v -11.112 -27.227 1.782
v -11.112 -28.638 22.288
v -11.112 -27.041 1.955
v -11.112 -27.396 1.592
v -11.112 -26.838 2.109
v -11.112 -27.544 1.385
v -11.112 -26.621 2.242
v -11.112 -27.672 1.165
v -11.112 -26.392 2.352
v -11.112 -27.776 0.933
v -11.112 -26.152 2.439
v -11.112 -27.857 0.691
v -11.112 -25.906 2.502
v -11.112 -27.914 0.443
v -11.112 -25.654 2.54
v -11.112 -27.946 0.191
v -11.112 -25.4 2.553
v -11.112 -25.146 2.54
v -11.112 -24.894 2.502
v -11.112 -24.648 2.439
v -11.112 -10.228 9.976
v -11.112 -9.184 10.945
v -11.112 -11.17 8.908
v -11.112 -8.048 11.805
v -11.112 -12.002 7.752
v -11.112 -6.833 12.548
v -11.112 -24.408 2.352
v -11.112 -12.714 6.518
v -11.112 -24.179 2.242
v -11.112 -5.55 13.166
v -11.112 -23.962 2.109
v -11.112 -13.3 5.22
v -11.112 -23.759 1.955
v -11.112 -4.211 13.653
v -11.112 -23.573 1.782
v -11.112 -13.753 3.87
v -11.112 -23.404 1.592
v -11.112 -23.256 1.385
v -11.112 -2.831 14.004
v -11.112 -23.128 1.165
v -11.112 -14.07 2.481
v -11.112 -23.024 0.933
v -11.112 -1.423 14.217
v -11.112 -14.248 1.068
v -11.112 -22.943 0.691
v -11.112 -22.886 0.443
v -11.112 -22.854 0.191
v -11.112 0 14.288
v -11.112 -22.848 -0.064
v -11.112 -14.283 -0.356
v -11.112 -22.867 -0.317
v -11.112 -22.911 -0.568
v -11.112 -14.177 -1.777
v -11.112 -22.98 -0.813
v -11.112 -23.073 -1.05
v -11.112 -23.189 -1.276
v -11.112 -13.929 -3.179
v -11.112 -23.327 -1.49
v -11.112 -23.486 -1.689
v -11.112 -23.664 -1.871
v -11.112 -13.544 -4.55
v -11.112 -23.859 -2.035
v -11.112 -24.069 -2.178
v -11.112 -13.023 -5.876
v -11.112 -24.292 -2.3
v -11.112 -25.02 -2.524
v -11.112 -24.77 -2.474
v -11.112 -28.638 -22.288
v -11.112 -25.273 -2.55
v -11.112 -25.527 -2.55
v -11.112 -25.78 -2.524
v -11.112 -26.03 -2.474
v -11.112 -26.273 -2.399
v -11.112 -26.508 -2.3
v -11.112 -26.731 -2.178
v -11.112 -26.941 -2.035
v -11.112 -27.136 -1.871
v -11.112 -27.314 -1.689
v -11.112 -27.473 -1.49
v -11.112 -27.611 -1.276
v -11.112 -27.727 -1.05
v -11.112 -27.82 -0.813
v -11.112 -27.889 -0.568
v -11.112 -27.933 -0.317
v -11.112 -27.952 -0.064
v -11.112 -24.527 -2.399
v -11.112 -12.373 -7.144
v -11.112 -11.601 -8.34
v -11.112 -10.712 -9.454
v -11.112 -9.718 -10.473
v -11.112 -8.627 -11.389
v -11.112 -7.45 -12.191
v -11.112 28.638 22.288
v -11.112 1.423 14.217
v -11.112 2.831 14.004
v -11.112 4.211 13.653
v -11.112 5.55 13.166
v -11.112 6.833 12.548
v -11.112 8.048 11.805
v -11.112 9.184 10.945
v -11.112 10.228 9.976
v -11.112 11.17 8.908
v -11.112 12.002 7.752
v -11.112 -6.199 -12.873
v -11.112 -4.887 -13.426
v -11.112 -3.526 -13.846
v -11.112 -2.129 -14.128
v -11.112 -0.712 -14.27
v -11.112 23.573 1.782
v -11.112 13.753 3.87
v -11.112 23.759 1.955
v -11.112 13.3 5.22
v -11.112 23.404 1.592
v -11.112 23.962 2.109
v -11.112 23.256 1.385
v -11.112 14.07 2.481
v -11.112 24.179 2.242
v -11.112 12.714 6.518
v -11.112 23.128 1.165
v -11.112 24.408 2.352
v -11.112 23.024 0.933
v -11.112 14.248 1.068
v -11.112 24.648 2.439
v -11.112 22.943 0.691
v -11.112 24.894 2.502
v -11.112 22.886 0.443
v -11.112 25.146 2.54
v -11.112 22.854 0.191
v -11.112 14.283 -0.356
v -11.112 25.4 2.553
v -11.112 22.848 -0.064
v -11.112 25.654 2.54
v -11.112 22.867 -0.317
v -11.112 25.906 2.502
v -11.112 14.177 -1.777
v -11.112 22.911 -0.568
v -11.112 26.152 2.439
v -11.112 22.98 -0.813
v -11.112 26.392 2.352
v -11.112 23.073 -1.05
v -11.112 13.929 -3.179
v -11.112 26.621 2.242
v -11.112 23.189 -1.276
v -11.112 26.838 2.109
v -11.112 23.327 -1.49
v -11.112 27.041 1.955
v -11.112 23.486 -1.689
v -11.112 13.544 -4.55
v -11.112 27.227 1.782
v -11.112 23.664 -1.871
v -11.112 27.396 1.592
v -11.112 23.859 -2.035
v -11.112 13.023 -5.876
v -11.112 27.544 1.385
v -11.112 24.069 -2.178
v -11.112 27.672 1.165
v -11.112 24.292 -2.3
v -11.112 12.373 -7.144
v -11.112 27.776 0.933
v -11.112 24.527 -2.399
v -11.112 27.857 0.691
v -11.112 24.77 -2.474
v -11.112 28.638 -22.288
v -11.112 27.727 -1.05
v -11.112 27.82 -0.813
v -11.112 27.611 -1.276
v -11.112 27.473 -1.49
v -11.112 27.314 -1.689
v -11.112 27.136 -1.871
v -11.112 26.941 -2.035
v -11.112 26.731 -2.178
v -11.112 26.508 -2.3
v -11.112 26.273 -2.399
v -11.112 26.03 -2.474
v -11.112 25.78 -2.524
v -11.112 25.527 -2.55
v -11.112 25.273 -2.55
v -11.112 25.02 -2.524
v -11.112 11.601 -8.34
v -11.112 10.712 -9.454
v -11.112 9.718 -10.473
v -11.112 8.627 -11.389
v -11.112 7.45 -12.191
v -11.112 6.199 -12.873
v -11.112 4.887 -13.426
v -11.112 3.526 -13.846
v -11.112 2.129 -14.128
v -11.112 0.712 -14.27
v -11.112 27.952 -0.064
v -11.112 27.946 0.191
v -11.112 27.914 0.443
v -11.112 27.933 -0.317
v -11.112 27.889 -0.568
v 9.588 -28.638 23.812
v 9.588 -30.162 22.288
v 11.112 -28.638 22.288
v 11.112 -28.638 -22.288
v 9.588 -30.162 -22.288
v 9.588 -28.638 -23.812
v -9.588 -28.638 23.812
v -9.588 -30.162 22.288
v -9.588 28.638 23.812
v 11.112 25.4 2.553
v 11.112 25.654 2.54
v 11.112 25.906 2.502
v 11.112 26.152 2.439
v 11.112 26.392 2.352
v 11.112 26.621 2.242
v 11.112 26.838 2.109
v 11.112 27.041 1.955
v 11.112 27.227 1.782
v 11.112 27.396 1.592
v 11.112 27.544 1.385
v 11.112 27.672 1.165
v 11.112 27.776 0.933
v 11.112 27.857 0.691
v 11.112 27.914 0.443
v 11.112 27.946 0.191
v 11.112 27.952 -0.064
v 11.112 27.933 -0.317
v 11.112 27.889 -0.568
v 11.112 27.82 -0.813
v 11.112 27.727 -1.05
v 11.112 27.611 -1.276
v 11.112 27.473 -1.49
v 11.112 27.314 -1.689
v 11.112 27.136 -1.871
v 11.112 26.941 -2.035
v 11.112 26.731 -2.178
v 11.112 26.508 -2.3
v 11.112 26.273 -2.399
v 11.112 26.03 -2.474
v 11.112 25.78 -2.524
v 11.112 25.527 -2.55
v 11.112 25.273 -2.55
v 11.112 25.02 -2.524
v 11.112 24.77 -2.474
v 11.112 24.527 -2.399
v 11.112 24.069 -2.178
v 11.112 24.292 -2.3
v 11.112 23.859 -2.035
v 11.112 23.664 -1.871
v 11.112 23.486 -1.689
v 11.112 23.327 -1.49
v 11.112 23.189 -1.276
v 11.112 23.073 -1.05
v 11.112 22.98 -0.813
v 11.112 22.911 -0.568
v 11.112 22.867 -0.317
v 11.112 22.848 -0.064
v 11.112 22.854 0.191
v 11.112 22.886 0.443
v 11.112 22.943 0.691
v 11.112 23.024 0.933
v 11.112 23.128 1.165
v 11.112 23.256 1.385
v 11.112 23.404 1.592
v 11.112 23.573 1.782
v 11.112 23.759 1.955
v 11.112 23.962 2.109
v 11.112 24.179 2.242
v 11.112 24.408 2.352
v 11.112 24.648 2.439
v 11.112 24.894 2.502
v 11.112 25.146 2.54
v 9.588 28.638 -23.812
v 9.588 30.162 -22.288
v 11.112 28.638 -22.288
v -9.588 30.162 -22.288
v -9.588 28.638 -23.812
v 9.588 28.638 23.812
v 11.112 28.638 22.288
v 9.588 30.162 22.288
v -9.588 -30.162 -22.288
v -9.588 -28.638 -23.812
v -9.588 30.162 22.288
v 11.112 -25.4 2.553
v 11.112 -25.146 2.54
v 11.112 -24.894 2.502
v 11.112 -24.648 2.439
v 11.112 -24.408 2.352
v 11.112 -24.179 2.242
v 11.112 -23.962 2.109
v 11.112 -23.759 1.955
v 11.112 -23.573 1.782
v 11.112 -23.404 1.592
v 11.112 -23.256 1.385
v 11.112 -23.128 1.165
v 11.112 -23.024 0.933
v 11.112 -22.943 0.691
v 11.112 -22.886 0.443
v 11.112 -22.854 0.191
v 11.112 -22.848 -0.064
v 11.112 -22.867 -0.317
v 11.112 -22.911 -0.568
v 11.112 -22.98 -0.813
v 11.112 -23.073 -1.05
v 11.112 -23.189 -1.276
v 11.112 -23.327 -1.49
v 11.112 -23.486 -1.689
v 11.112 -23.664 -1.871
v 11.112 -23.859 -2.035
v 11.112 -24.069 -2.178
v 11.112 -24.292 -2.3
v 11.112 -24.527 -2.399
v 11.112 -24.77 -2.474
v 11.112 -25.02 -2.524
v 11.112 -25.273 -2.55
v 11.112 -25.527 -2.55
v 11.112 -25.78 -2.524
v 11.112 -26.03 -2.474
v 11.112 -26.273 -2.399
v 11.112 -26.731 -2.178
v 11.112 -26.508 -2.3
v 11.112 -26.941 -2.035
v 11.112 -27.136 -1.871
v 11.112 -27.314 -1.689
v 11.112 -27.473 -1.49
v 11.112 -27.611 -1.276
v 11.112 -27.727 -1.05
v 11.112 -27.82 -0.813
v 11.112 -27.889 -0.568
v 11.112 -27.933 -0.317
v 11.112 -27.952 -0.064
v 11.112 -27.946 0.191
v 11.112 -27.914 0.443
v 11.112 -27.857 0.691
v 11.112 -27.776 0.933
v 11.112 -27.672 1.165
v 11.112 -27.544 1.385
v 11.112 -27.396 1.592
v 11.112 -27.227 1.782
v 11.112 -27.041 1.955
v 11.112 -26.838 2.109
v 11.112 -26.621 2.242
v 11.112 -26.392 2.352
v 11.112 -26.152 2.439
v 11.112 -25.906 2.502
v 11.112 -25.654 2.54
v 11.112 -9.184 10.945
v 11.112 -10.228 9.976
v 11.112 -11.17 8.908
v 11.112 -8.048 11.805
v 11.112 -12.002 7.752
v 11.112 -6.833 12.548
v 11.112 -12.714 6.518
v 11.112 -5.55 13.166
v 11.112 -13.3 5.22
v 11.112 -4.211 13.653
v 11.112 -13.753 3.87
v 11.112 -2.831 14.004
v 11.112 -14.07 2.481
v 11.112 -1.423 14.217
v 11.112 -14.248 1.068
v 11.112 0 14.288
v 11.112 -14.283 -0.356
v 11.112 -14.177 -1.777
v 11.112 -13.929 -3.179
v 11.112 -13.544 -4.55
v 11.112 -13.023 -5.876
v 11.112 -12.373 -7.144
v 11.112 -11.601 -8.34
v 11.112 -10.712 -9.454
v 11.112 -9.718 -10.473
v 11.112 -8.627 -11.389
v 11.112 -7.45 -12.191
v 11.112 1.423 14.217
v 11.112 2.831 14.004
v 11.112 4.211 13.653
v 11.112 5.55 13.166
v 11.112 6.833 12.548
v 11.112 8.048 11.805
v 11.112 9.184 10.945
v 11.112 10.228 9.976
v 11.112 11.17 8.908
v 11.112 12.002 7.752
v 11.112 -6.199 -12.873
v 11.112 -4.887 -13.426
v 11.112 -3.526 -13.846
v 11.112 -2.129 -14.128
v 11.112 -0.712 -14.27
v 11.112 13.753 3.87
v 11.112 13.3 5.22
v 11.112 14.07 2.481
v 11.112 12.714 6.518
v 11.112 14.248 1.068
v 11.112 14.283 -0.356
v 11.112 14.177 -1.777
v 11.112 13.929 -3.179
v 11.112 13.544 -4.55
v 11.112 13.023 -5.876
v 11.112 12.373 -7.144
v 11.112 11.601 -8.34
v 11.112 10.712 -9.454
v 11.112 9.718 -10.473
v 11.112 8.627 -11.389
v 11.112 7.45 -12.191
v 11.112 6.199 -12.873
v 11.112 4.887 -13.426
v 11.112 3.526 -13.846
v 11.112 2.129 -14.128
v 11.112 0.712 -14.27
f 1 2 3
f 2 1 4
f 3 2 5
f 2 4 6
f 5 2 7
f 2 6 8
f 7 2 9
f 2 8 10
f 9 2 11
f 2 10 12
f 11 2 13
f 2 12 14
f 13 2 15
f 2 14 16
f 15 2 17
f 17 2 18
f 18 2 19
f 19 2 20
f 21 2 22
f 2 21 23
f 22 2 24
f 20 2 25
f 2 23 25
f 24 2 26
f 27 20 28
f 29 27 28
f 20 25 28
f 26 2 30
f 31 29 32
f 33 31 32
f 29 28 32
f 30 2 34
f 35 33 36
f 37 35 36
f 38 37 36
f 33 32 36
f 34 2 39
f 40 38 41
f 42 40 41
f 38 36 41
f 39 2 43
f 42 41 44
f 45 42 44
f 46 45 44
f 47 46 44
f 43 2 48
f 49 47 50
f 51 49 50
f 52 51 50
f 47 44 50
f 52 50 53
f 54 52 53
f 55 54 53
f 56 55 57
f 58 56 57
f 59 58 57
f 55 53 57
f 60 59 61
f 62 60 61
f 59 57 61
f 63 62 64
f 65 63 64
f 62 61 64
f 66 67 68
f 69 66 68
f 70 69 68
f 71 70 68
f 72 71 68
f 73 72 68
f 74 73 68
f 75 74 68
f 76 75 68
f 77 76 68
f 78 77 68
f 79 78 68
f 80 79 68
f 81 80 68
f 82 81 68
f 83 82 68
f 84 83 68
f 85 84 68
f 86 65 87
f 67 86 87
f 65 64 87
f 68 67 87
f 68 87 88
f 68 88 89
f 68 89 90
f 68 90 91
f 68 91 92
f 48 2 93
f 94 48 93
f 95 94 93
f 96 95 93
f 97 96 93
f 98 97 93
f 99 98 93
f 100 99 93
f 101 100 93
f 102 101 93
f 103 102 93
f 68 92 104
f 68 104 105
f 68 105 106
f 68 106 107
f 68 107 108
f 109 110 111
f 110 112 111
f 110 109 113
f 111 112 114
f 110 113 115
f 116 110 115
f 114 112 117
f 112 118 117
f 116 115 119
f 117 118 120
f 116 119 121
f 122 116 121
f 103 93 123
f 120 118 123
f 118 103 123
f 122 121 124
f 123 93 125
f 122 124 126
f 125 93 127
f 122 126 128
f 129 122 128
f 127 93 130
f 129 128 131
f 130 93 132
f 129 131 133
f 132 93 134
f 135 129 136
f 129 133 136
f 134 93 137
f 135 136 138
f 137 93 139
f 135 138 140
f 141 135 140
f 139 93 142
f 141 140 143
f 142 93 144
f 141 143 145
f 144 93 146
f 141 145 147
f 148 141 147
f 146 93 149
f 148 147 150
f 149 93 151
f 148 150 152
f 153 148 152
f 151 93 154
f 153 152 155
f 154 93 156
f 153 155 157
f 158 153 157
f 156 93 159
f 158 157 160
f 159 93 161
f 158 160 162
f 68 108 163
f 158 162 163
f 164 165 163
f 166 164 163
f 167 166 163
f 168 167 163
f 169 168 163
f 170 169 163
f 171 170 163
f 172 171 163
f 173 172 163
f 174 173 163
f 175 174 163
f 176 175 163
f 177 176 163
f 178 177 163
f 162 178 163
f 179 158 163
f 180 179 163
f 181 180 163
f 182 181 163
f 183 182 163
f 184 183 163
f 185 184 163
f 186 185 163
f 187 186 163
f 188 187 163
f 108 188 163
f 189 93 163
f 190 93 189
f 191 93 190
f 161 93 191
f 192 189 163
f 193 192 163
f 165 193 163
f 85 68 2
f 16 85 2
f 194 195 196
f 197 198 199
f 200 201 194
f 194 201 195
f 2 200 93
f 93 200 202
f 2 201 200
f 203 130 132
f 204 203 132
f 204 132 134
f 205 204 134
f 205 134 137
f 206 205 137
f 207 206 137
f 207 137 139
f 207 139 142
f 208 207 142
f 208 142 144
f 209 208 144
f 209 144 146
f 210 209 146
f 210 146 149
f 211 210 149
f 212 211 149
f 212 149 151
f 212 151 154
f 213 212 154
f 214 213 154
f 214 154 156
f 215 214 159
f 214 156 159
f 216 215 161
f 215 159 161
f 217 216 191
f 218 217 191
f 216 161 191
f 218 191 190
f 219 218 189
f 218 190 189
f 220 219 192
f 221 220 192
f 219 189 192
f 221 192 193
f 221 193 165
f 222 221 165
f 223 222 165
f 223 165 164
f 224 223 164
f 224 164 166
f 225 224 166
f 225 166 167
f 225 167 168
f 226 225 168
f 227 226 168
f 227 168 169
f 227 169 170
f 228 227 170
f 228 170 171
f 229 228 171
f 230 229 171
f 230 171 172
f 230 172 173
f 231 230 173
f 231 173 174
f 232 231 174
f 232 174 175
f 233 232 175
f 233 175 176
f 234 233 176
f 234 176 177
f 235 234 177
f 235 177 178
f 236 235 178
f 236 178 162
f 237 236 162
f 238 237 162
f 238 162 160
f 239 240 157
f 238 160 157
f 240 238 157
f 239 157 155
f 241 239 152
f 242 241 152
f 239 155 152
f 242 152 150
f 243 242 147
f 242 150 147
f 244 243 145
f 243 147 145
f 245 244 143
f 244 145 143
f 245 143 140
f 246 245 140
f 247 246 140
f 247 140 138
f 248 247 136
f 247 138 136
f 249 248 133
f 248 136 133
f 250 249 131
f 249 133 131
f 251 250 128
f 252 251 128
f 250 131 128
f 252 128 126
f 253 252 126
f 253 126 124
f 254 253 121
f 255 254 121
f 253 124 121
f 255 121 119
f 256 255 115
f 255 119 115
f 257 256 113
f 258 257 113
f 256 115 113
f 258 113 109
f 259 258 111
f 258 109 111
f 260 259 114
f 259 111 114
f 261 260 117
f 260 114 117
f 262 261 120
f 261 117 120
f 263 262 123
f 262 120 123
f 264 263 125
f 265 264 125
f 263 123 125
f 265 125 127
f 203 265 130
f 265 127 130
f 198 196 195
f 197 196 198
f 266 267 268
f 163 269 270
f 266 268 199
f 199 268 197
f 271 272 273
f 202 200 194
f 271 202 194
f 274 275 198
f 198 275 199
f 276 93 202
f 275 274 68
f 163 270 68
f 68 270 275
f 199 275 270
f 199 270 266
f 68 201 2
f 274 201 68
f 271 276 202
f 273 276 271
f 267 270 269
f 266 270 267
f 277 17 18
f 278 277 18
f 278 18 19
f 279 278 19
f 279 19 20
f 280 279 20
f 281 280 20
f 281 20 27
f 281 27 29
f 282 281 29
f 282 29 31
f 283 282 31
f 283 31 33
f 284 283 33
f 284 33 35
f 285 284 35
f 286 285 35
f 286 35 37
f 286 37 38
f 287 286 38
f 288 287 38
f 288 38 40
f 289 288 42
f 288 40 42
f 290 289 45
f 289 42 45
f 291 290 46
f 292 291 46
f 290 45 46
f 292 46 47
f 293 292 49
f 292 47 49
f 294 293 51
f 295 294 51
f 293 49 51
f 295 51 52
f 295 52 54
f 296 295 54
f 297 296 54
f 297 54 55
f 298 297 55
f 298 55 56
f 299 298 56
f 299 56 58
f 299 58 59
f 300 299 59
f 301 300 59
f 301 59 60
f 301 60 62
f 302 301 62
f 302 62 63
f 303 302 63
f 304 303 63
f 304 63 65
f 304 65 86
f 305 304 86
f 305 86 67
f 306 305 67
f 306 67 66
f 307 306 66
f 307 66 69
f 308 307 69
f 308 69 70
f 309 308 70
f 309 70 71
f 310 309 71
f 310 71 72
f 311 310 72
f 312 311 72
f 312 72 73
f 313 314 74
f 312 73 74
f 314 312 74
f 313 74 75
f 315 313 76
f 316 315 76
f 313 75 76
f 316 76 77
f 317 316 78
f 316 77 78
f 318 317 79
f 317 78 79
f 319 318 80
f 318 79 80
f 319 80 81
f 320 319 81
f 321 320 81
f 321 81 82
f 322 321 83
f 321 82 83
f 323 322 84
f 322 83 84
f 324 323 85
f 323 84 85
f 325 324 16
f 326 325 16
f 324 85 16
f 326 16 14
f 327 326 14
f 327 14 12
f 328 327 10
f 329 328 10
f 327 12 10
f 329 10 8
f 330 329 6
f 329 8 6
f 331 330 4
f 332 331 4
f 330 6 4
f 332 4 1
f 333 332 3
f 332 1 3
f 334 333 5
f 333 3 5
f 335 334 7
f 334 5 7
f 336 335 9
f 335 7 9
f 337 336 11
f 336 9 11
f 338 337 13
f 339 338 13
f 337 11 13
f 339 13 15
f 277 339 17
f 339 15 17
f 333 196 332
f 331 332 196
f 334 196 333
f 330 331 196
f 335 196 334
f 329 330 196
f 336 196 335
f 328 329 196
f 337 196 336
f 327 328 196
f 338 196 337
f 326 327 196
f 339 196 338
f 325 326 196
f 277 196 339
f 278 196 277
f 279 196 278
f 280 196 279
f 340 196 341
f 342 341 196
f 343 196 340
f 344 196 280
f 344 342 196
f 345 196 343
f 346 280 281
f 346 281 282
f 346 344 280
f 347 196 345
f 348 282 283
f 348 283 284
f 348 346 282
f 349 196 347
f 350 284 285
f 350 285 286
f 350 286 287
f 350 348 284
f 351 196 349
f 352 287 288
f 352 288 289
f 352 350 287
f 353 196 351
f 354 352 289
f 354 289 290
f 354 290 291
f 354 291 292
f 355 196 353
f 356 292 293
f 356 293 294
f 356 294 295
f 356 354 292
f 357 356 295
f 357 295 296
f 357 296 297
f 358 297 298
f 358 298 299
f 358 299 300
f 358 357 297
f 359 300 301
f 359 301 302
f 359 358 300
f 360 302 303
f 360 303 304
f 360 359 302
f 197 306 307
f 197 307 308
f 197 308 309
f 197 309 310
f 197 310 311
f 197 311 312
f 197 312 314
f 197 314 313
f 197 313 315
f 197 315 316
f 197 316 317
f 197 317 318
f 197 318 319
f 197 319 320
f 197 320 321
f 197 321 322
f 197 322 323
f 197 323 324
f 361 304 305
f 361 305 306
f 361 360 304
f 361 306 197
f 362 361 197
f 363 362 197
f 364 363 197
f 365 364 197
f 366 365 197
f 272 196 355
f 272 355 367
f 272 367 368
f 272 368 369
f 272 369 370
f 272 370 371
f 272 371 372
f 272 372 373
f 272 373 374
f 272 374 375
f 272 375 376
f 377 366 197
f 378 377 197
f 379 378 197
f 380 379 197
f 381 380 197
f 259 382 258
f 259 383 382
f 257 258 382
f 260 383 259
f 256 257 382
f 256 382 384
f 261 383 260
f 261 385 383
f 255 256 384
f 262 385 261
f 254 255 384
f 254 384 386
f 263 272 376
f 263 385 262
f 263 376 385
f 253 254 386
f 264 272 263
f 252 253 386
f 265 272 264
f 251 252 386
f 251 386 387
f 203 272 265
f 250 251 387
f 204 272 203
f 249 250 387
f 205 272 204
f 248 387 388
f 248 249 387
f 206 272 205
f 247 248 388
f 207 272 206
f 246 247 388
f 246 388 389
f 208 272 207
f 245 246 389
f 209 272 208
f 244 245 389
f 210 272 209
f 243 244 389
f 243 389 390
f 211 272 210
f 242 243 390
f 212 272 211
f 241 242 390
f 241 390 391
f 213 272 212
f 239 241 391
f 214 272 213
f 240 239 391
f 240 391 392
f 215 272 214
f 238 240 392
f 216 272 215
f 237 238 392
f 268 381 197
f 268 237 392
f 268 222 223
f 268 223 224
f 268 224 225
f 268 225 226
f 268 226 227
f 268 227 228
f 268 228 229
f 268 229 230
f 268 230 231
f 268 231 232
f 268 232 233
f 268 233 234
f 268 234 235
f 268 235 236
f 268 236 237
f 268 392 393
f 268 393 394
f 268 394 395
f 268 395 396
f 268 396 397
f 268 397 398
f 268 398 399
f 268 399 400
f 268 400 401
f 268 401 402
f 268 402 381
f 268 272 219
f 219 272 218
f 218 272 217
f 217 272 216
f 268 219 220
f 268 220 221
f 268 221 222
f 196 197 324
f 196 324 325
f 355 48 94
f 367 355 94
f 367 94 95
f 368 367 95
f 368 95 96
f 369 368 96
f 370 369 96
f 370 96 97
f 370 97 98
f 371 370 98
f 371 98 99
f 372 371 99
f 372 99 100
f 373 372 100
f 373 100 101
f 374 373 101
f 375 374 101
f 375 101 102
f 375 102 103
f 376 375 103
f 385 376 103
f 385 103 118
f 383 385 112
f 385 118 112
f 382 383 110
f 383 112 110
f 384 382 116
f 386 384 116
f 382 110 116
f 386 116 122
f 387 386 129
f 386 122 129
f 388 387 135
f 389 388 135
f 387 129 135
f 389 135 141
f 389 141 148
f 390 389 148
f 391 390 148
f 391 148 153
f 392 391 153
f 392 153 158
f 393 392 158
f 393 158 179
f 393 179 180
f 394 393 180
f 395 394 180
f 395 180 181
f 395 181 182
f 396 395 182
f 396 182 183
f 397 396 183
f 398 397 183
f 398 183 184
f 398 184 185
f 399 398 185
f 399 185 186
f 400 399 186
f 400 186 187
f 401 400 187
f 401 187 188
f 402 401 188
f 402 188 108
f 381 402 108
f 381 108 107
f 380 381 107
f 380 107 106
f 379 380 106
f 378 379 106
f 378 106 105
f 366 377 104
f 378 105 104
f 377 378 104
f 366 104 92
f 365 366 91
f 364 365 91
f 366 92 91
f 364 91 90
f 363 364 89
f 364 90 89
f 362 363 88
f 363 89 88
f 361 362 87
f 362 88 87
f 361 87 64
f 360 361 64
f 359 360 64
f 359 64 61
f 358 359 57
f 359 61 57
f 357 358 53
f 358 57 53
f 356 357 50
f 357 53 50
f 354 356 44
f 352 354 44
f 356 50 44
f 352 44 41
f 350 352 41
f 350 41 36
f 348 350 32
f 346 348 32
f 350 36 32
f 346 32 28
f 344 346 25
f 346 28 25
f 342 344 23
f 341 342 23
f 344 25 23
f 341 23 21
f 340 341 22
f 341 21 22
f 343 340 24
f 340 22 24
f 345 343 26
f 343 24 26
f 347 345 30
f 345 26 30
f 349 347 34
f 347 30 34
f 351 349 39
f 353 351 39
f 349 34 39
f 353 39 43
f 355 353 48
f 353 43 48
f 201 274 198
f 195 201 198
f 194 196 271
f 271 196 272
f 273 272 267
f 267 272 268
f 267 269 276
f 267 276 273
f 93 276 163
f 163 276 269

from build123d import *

# Parameters (mm, degrees)
SKETCH1_W           = 22.225
SKETCH1_H           = 47.625
BOSS_EXTRUDE1_DEPTH = 30.1625
SKETCH2_R           = 14.2875
SKETCH2_R_2         = 2.5527
CUT_EXTRUDE1_DEPTH  = 45.393267367
CHAMFER1_SIZE       = 1.524


with BuildPart() as part:
    # Sketch1 → Boss-Extrude1 (new, symmetric)
    with BuildSketch(Plane(origin=(0, 0, 0), x_dir=(1, 0, 0), z_dir=(0, 1, 0))):
        Rectangle(SKETCH1_W, SKETCH1_H)
    extrude(amount=BOSS_EXTRUDE1_DEPTH, both=True)

    # Sketch2 → Cut-Extrude1 (cut, through all)
    with BuildSketch(Plane.ZY.offset(11.1125)):
        Circle(SKETCH2_R)
        with Locations((0, 25.4)):
            Circle(SKETCH2_R_2)
        with Locations((0, -25.4)):
            Circle(SKETCH2_R_2)
    extrude(amount=-CUT_EXTRUDE1_DEPTH, mode=Mode.SUBTRACT)

    # Chamfer1
    chamfer1_edges = [part.edges().sort_by_distance(p)[0] for p in [
        (11.1125, 30.1625, 0),
        (0, 30.1625, -23.8125),
        (-11.1125, 30.1625, 0),
        (0, -30.1625, -23.8125),
        (11.1125, -30.1625, 0),
        (0, -30.1625, 23.8125),
        (-11.1125, -30.1625, 0),
        (-11.1125, 0, -23.8125),
        (11.1125, 0, -23.8125),
        (11.1125, 0, 23.8125),
        (-11.1125, 0, 23.8125),
        (0, 30.1625, 23.8125),
    ]]
    chamfer(chamfer1_edges, length=CHAMFER1_SIZE)


solid = part.part
